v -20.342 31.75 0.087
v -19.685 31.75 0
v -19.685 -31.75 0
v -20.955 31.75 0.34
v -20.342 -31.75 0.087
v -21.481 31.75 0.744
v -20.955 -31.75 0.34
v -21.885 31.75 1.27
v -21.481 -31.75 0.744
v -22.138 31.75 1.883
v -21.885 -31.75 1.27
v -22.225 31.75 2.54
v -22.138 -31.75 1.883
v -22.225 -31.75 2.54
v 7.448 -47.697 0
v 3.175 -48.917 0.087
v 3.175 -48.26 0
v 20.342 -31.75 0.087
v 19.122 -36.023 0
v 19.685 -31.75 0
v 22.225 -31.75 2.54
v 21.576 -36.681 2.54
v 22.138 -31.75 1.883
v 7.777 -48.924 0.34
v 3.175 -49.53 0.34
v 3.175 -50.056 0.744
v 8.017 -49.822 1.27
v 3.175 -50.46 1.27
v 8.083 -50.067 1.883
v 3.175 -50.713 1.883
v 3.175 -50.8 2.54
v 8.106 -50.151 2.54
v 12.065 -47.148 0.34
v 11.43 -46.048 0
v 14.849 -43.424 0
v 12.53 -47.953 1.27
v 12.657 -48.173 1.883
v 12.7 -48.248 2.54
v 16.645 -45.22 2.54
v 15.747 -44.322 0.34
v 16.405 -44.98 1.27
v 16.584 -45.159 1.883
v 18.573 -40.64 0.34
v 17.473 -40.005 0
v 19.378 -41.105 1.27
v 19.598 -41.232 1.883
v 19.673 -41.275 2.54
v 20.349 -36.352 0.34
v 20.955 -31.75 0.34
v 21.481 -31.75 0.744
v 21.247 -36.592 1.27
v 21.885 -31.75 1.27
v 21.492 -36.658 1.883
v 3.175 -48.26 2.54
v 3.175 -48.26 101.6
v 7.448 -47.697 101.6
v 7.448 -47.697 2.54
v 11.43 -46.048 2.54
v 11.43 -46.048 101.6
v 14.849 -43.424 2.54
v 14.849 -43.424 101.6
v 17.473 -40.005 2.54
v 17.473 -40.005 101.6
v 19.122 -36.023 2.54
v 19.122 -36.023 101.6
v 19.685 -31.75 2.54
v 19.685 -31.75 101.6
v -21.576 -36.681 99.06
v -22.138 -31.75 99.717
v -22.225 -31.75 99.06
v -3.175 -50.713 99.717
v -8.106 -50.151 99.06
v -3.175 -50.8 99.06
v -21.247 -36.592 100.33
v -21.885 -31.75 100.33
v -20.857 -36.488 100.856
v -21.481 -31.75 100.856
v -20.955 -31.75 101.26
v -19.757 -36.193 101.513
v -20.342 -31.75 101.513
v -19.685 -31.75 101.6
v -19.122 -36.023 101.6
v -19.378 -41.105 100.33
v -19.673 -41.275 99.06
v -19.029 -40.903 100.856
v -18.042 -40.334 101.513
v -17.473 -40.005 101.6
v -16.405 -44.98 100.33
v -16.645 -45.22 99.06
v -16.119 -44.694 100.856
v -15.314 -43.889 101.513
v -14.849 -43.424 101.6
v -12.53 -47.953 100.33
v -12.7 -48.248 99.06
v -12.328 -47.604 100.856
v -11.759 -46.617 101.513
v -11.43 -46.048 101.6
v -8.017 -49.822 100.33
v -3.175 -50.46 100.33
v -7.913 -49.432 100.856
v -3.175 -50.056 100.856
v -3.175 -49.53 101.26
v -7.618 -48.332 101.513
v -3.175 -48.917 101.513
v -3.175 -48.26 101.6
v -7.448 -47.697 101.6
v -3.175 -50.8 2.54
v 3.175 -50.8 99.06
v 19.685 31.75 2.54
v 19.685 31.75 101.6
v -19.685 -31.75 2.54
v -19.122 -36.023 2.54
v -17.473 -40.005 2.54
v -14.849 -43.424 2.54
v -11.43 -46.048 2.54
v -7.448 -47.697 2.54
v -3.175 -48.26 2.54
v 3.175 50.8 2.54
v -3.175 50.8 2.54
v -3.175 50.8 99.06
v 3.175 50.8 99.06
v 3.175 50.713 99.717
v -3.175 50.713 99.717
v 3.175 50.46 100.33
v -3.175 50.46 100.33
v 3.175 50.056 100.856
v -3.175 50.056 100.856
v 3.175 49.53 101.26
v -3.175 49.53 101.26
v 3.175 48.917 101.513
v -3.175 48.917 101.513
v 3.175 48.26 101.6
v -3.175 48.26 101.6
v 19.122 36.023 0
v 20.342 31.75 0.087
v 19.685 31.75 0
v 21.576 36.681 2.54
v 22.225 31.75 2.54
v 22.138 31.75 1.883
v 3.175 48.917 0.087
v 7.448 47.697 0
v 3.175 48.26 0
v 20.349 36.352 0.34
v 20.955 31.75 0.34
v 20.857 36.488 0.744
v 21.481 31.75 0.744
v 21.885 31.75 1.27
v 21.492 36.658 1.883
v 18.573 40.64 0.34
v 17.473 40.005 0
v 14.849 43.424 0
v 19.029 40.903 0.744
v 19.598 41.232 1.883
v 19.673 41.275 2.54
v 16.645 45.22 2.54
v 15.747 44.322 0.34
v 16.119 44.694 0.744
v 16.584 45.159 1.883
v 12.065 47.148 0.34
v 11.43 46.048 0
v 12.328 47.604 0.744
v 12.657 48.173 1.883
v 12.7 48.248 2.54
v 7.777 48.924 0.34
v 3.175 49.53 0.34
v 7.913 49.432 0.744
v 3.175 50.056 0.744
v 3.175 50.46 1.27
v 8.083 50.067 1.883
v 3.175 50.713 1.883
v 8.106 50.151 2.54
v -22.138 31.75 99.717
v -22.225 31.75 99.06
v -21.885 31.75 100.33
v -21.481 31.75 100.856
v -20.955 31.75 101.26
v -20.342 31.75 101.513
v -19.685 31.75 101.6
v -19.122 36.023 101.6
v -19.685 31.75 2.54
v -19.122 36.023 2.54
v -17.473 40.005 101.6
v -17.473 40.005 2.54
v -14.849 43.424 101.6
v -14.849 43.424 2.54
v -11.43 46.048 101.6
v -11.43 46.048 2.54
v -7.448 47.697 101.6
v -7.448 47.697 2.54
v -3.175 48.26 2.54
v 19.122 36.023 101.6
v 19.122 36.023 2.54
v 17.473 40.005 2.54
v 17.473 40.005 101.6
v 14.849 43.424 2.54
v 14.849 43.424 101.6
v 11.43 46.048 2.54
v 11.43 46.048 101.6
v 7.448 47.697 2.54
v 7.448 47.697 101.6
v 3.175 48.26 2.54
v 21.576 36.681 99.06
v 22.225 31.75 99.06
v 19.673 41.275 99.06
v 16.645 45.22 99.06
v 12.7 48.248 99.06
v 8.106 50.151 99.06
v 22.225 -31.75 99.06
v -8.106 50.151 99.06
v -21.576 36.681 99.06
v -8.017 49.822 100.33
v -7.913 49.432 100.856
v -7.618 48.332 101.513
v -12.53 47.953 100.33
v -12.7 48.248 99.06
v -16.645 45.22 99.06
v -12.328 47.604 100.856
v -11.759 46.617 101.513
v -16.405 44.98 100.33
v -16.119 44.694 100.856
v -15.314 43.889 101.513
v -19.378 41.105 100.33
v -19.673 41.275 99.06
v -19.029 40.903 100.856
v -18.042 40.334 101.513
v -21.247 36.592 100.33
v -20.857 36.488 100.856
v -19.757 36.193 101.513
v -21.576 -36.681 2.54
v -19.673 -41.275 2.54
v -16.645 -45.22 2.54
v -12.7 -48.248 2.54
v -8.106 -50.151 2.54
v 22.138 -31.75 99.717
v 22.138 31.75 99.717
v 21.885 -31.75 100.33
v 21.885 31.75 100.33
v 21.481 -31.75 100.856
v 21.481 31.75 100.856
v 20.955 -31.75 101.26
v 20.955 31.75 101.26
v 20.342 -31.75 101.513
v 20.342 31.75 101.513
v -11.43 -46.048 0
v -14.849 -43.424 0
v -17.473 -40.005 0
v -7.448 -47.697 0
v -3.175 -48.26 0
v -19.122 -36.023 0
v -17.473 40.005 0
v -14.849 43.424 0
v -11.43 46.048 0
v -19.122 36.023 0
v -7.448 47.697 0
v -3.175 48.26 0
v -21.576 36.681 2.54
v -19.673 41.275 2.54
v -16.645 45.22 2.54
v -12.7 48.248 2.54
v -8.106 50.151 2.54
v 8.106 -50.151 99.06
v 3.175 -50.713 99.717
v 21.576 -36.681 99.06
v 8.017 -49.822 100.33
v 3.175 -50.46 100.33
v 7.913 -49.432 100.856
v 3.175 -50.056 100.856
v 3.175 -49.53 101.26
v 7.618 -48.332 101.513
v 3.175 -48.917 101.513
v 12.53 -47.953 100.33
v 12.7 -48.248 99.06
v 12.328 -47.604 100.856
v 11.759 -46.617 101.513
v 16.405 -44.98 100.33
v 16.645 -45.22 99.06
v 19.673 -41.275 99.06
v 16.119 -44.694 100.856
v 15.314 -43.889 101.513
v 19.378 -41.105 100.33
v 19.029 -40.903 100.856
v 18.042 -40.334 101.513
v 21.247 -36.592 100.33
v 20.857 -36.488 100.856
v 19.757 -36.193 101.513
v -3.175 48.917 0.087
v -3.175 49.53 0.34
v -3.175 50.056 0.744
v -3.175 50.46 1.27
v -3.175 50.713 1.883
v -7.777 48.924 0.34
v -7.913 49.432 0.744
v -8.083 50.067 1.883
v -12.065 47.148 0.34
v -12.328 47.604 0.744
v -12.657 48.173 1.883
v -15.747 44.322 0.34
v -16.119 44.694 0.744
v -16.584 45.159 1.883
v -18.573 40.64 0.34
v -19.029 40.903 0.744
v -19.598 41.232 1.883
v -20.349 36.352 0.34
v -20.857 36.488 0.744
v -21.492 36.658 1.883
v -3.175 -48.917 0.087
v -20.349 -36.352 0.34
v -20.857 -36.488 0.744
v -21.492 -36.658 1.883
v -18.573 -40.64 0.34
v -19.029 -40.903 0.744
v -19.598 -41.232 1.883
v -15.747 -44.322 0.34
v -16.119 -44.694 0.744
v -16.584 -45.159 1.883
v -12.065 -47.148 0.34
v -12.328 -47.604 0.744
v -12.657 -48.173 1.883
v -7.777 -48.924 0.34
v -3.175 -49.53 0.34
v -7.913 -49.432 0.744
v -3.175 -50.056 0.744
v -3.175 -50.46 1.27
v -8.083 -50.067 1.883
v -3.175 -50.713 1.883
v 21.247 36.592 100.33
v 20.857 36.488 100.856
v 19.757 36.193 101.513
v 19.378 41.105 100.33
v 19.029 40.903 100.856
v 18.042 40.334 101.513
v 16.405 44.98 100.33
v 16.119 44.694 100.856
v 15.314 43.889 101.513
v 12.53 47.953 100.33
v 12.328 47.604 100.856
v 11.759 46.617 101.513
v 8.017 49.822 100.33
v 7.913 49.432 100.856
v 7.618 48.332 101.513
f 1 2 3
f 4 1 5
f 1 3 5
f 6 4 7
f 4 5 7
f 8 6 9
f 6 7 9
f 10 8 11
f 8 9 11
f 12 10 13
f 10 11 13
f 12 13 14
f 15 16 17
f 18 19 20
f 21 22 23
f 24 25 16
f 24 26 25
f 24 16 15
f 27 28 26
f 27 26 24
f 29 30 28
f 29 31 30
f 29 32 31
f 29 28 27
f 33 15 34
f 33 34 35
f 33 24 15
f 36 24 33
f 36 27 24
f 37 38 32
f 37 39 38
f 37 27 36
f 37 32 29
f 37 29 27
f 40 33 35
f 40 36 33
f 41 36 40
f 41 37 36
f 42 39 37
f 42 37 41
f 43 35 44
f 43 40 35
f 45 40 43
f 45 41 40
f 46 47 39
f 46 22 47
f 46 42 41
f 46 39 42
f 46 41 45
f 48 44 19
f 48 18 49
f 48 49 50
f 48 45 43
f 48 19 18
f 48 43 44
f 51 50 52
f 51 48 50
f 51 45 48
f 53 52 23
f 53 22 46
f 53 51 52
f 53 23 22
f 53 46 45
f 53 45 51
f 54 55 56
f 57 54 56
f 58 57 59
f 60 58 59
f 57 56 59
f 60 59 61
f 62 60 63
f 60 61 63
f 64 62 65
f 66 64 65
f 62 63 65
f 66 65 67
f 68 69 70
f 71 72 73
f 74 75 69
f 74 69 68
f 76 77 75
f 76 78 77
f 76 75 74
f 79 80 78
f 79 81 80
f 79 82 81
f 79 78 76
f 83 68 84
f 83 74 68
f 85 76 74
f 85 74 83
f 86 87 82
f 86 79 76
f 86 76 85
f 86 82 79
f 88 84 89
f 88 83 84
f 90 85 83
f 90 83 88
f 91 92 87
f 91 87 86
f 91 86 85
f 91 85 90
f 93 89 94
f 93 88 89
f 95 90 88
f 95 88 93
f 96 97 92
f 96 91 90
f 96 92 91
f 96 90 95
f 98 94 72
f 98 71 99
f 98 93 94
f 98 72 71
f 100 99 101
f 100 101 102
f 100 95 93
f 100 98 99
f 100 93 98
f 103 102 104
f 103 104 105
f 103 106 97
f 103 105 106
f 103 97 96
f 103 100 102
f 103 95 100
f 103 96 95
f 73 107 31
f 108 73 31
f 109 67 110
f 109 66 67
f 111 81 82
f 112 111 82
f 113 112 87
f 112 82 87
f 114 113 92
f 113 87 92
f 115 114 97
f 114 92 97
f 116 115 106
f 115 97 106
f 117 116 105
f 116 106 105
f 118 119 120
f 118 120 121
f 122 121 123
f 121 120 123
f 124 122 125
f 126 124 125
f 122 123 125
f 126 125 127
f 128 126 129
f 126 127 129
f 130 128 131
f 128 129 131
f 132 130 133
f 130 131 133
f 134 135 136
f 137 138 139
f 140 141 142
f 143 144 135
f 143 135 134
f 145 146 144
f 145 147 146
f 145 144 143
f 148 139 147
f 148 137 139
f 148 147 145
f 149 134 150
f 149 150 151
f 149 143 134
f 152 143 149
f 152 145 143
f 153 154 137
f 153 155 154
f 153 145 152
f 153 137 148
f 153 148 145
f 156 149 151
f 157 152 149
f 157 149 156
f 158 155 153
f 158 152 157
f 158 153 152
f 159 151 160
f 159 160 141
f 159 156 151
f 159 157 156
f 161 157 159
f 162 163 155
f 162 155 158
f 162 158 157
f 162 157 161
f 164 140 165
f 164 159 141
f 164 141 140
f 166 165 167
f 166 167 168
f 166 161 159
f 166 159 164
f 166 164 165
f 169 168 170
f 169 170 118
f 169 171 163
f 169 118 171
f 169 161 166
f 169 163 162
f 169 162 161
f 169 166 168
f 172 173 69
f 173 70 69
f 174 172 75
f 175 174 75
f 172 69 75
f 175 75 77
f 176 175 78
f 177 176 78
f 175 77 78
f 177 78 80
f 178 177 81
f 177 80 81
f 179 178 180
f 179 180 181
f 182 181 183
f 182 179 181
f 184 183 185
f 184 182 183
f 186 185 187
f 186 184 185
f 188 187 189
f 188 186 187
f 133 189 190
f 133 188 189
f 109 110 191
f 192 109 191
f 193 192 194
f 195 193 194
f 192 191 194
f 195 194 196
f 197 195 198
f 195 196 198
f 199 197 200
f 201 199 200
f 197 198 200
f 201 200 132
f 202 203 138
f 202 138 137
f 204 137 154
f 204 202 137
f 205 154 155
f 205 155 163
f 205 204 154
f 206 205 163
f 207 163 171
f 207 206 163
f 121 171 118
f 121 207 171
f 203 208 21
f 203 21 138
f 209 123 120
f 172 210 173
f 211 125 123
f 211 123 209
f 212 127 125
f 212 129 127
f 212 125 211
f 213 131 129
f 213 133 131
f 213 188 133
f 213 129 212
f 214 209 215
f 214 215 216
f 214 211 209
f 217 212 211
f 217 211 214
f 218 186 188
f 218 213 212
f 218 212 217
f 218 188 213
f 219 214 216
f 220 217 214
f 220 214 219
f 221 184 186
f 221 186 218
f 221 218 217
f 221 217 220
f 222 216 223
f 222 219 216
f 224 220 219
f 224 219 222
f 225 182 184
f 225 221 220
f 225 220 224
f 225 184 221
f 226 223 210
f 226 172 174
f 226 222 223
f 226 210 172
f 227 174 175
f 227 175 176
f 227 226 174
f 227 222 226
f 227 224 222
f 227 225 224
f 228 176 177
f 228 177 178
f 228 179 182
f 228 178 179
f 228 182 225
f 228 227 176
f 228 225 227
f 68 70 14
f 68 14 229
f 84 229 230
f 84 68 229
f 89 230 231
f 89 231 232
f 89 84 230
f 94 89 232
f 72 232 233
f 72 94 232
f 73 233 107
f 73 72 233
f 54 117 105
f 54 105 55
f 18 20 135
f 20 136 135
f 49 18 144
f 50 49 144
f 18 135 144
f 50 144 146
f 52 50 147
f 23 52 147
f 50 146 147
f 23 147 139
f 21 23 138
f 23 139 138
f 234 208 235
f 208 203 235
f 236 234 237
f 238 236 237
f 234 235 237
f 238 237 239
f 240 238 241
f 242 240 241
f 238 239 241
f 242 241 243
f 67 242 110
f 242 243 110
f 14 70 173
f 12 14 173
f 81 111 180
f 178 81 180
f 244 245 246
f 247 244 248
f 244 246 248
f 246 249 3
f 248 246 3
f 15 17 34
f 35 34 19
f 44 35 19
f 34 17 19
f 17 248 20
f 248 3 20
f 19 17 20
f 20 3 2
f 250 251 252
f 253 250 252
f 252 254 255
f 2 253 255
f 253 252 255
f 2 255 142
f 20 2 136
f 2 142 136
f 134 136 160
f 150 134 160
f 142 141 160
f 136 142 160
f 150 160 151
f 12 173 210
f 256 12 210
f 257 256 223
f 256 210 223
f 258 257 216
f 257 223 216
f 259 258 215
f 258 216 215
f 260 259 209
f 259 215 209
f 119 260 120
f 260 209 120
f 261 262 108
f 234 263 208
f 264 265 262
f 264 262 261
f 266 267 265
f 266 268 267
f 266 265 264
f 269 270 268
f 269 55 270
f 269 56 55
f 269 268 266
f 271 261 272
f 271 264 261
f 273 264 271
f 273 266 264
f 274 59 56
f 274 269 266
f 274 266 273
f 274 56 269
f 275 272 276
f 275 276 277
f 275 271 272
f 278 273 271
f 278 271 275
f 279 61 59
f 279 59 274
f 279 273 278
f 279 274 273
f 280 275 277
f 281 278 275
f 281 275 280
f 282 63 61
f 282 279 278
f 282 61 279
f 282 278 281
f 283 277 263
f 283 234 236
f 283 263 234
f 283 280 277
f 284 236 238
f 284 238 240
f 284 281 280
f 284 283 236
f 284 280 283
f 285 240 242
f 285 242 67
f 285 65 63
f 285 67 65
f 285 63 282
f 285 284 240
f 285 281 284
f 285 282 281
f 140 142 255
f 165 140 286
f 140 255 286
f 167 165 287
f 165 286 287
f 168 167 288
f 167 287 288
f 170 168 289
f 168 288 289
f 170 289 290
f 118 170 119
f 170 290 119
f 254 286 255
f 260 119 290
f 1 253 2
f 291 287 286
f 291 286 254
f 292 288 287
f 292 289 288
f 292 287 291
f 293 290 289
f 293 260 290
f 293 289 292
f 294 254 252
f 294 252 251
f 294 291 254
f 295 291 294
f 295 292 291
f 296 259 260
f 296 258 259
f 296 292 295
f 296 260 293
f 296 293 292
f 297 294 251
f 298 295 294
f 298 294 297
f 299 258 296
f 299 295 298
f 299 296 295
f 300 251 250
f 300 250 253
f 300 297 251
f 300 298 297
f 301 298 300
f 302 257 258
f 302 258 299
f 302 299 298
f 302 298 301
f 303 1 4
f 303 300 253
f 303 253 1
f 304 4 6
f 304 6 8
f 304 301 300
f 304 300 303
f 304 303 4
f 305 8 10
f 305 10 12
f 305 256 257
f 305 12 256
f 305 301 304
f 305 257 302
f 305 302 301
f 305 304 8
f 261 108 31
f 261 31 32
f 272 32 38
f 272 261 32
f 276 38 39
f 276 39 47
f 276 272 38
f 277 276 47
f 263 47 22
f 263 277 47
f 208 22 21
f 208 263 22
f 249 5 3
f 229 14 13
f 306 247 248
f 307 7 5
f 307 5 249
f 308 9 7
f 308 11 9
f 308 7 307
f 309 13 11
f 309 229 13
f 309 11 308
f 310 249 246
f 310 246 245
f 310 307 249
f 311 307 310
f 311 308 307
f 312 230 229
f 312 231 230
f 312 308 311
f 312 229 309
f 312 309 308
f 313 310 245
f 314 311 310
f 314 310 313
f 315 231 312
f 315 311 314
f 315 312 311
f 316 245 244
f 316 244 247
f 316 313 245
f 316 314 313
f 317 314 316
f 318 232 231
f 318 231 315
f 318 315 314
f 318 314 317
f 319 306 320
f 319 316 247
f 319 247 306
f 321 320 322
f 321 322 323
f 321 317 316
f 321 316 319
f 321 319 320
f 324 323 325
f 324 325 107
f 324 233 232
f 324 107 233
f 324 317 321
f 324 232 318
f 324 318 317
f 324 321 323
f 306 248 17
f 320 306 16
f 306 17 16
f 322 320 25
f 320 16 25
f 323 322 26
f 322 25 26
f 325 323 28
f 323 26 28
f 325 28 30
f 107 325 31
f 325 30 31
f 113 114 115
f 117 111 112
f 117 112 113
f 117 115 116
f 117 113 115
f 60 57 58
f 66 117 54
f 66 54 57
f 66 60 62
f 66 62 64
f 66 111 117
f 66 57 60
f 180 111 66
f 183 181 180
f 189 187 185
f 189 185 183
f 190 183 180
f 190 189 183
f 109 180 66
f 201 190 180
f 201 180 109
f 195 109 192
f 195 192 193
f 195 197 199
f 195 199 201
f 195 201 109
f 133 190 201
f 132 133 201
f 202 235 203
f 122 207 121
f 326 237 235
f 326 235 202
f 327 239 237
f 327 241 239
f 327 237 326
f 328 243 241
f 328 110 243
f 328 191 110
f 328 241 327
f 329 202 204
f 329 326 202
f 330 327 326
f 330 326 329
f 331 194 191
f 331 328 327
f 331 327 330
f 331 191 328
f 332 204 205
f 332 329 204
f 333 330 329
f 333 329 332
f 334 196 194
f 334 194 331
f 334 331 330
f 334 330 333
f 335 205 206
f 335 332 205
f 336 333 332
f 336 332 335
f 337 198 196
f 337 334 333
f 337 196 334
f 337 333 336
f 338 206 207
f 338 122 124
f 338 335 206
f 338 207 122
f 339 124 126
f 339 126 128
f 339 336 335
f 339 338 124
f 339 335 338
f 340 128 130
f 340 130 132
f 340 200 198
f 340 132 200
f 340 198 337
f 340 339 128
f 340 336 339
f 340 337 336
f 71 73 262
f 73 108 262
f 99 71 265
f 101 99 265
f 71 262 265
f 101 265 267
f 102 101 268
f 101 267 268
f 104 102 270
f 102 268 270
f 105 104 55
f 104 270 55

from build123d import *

# Parameters (mm, degrees)
F0_W     = 44.45
F0_H     = 101.6
F1_DEPTH = 101.6
F2_R     = 19.05
F3_T     = -2.54
F4_R     = 2.53999


# Not quite as in the source:
# - a fillet or chamfer is up to 0.001 mm smaller than in the source, because OpenCascade refuses the exact size


with BuildPart() as f1:
    # F0 (on Top) → F1 (new body)
    with BuildSketch(Plane.XY):
        Rectangle(F0_W, F0_H)
    extrude(amount=F1_DEPTH)

    # F2
    f2_edges = [f1.edges().sort_by_distance(p)[0] for p in [
        (-22.225, 50.8, 50.8),
        (-22.225, -50.8, 50.8),
        (22.225, -50.8, 50.8),
        (22.225, 50.8, 50.8),
    ]]
    fillet(f2_edges, radius=F2_R)

    # F3
    f3_openings = [f1.faces().sort_by_distance(p)[0] for p in [
        (0, 0, 101.6),
    ]]
    offset(amount=F3_T, openings=f3_openings)

    # F4 (radius 2.54 in the source; OpenCascade refuses exactly that, so slightly less here)
    f4_edges = [f1.edges().sort_by_distance(p)[0] for p in [
        (22.225, 0, 0),
        (22.225, -31.75, 50.8),
        (22.225, 31.75, 50.8),
        (22.225, 0, 101.6),
        (-22.225, 0, 0),
        (-22.225, 31.75, 50.8),
        (-22.225, -31.75, 50.8),
        (-22.225, 0, 101.6),
    ]]
    fillet(f4_edges, radius=F4_R)


solid = f1.part
